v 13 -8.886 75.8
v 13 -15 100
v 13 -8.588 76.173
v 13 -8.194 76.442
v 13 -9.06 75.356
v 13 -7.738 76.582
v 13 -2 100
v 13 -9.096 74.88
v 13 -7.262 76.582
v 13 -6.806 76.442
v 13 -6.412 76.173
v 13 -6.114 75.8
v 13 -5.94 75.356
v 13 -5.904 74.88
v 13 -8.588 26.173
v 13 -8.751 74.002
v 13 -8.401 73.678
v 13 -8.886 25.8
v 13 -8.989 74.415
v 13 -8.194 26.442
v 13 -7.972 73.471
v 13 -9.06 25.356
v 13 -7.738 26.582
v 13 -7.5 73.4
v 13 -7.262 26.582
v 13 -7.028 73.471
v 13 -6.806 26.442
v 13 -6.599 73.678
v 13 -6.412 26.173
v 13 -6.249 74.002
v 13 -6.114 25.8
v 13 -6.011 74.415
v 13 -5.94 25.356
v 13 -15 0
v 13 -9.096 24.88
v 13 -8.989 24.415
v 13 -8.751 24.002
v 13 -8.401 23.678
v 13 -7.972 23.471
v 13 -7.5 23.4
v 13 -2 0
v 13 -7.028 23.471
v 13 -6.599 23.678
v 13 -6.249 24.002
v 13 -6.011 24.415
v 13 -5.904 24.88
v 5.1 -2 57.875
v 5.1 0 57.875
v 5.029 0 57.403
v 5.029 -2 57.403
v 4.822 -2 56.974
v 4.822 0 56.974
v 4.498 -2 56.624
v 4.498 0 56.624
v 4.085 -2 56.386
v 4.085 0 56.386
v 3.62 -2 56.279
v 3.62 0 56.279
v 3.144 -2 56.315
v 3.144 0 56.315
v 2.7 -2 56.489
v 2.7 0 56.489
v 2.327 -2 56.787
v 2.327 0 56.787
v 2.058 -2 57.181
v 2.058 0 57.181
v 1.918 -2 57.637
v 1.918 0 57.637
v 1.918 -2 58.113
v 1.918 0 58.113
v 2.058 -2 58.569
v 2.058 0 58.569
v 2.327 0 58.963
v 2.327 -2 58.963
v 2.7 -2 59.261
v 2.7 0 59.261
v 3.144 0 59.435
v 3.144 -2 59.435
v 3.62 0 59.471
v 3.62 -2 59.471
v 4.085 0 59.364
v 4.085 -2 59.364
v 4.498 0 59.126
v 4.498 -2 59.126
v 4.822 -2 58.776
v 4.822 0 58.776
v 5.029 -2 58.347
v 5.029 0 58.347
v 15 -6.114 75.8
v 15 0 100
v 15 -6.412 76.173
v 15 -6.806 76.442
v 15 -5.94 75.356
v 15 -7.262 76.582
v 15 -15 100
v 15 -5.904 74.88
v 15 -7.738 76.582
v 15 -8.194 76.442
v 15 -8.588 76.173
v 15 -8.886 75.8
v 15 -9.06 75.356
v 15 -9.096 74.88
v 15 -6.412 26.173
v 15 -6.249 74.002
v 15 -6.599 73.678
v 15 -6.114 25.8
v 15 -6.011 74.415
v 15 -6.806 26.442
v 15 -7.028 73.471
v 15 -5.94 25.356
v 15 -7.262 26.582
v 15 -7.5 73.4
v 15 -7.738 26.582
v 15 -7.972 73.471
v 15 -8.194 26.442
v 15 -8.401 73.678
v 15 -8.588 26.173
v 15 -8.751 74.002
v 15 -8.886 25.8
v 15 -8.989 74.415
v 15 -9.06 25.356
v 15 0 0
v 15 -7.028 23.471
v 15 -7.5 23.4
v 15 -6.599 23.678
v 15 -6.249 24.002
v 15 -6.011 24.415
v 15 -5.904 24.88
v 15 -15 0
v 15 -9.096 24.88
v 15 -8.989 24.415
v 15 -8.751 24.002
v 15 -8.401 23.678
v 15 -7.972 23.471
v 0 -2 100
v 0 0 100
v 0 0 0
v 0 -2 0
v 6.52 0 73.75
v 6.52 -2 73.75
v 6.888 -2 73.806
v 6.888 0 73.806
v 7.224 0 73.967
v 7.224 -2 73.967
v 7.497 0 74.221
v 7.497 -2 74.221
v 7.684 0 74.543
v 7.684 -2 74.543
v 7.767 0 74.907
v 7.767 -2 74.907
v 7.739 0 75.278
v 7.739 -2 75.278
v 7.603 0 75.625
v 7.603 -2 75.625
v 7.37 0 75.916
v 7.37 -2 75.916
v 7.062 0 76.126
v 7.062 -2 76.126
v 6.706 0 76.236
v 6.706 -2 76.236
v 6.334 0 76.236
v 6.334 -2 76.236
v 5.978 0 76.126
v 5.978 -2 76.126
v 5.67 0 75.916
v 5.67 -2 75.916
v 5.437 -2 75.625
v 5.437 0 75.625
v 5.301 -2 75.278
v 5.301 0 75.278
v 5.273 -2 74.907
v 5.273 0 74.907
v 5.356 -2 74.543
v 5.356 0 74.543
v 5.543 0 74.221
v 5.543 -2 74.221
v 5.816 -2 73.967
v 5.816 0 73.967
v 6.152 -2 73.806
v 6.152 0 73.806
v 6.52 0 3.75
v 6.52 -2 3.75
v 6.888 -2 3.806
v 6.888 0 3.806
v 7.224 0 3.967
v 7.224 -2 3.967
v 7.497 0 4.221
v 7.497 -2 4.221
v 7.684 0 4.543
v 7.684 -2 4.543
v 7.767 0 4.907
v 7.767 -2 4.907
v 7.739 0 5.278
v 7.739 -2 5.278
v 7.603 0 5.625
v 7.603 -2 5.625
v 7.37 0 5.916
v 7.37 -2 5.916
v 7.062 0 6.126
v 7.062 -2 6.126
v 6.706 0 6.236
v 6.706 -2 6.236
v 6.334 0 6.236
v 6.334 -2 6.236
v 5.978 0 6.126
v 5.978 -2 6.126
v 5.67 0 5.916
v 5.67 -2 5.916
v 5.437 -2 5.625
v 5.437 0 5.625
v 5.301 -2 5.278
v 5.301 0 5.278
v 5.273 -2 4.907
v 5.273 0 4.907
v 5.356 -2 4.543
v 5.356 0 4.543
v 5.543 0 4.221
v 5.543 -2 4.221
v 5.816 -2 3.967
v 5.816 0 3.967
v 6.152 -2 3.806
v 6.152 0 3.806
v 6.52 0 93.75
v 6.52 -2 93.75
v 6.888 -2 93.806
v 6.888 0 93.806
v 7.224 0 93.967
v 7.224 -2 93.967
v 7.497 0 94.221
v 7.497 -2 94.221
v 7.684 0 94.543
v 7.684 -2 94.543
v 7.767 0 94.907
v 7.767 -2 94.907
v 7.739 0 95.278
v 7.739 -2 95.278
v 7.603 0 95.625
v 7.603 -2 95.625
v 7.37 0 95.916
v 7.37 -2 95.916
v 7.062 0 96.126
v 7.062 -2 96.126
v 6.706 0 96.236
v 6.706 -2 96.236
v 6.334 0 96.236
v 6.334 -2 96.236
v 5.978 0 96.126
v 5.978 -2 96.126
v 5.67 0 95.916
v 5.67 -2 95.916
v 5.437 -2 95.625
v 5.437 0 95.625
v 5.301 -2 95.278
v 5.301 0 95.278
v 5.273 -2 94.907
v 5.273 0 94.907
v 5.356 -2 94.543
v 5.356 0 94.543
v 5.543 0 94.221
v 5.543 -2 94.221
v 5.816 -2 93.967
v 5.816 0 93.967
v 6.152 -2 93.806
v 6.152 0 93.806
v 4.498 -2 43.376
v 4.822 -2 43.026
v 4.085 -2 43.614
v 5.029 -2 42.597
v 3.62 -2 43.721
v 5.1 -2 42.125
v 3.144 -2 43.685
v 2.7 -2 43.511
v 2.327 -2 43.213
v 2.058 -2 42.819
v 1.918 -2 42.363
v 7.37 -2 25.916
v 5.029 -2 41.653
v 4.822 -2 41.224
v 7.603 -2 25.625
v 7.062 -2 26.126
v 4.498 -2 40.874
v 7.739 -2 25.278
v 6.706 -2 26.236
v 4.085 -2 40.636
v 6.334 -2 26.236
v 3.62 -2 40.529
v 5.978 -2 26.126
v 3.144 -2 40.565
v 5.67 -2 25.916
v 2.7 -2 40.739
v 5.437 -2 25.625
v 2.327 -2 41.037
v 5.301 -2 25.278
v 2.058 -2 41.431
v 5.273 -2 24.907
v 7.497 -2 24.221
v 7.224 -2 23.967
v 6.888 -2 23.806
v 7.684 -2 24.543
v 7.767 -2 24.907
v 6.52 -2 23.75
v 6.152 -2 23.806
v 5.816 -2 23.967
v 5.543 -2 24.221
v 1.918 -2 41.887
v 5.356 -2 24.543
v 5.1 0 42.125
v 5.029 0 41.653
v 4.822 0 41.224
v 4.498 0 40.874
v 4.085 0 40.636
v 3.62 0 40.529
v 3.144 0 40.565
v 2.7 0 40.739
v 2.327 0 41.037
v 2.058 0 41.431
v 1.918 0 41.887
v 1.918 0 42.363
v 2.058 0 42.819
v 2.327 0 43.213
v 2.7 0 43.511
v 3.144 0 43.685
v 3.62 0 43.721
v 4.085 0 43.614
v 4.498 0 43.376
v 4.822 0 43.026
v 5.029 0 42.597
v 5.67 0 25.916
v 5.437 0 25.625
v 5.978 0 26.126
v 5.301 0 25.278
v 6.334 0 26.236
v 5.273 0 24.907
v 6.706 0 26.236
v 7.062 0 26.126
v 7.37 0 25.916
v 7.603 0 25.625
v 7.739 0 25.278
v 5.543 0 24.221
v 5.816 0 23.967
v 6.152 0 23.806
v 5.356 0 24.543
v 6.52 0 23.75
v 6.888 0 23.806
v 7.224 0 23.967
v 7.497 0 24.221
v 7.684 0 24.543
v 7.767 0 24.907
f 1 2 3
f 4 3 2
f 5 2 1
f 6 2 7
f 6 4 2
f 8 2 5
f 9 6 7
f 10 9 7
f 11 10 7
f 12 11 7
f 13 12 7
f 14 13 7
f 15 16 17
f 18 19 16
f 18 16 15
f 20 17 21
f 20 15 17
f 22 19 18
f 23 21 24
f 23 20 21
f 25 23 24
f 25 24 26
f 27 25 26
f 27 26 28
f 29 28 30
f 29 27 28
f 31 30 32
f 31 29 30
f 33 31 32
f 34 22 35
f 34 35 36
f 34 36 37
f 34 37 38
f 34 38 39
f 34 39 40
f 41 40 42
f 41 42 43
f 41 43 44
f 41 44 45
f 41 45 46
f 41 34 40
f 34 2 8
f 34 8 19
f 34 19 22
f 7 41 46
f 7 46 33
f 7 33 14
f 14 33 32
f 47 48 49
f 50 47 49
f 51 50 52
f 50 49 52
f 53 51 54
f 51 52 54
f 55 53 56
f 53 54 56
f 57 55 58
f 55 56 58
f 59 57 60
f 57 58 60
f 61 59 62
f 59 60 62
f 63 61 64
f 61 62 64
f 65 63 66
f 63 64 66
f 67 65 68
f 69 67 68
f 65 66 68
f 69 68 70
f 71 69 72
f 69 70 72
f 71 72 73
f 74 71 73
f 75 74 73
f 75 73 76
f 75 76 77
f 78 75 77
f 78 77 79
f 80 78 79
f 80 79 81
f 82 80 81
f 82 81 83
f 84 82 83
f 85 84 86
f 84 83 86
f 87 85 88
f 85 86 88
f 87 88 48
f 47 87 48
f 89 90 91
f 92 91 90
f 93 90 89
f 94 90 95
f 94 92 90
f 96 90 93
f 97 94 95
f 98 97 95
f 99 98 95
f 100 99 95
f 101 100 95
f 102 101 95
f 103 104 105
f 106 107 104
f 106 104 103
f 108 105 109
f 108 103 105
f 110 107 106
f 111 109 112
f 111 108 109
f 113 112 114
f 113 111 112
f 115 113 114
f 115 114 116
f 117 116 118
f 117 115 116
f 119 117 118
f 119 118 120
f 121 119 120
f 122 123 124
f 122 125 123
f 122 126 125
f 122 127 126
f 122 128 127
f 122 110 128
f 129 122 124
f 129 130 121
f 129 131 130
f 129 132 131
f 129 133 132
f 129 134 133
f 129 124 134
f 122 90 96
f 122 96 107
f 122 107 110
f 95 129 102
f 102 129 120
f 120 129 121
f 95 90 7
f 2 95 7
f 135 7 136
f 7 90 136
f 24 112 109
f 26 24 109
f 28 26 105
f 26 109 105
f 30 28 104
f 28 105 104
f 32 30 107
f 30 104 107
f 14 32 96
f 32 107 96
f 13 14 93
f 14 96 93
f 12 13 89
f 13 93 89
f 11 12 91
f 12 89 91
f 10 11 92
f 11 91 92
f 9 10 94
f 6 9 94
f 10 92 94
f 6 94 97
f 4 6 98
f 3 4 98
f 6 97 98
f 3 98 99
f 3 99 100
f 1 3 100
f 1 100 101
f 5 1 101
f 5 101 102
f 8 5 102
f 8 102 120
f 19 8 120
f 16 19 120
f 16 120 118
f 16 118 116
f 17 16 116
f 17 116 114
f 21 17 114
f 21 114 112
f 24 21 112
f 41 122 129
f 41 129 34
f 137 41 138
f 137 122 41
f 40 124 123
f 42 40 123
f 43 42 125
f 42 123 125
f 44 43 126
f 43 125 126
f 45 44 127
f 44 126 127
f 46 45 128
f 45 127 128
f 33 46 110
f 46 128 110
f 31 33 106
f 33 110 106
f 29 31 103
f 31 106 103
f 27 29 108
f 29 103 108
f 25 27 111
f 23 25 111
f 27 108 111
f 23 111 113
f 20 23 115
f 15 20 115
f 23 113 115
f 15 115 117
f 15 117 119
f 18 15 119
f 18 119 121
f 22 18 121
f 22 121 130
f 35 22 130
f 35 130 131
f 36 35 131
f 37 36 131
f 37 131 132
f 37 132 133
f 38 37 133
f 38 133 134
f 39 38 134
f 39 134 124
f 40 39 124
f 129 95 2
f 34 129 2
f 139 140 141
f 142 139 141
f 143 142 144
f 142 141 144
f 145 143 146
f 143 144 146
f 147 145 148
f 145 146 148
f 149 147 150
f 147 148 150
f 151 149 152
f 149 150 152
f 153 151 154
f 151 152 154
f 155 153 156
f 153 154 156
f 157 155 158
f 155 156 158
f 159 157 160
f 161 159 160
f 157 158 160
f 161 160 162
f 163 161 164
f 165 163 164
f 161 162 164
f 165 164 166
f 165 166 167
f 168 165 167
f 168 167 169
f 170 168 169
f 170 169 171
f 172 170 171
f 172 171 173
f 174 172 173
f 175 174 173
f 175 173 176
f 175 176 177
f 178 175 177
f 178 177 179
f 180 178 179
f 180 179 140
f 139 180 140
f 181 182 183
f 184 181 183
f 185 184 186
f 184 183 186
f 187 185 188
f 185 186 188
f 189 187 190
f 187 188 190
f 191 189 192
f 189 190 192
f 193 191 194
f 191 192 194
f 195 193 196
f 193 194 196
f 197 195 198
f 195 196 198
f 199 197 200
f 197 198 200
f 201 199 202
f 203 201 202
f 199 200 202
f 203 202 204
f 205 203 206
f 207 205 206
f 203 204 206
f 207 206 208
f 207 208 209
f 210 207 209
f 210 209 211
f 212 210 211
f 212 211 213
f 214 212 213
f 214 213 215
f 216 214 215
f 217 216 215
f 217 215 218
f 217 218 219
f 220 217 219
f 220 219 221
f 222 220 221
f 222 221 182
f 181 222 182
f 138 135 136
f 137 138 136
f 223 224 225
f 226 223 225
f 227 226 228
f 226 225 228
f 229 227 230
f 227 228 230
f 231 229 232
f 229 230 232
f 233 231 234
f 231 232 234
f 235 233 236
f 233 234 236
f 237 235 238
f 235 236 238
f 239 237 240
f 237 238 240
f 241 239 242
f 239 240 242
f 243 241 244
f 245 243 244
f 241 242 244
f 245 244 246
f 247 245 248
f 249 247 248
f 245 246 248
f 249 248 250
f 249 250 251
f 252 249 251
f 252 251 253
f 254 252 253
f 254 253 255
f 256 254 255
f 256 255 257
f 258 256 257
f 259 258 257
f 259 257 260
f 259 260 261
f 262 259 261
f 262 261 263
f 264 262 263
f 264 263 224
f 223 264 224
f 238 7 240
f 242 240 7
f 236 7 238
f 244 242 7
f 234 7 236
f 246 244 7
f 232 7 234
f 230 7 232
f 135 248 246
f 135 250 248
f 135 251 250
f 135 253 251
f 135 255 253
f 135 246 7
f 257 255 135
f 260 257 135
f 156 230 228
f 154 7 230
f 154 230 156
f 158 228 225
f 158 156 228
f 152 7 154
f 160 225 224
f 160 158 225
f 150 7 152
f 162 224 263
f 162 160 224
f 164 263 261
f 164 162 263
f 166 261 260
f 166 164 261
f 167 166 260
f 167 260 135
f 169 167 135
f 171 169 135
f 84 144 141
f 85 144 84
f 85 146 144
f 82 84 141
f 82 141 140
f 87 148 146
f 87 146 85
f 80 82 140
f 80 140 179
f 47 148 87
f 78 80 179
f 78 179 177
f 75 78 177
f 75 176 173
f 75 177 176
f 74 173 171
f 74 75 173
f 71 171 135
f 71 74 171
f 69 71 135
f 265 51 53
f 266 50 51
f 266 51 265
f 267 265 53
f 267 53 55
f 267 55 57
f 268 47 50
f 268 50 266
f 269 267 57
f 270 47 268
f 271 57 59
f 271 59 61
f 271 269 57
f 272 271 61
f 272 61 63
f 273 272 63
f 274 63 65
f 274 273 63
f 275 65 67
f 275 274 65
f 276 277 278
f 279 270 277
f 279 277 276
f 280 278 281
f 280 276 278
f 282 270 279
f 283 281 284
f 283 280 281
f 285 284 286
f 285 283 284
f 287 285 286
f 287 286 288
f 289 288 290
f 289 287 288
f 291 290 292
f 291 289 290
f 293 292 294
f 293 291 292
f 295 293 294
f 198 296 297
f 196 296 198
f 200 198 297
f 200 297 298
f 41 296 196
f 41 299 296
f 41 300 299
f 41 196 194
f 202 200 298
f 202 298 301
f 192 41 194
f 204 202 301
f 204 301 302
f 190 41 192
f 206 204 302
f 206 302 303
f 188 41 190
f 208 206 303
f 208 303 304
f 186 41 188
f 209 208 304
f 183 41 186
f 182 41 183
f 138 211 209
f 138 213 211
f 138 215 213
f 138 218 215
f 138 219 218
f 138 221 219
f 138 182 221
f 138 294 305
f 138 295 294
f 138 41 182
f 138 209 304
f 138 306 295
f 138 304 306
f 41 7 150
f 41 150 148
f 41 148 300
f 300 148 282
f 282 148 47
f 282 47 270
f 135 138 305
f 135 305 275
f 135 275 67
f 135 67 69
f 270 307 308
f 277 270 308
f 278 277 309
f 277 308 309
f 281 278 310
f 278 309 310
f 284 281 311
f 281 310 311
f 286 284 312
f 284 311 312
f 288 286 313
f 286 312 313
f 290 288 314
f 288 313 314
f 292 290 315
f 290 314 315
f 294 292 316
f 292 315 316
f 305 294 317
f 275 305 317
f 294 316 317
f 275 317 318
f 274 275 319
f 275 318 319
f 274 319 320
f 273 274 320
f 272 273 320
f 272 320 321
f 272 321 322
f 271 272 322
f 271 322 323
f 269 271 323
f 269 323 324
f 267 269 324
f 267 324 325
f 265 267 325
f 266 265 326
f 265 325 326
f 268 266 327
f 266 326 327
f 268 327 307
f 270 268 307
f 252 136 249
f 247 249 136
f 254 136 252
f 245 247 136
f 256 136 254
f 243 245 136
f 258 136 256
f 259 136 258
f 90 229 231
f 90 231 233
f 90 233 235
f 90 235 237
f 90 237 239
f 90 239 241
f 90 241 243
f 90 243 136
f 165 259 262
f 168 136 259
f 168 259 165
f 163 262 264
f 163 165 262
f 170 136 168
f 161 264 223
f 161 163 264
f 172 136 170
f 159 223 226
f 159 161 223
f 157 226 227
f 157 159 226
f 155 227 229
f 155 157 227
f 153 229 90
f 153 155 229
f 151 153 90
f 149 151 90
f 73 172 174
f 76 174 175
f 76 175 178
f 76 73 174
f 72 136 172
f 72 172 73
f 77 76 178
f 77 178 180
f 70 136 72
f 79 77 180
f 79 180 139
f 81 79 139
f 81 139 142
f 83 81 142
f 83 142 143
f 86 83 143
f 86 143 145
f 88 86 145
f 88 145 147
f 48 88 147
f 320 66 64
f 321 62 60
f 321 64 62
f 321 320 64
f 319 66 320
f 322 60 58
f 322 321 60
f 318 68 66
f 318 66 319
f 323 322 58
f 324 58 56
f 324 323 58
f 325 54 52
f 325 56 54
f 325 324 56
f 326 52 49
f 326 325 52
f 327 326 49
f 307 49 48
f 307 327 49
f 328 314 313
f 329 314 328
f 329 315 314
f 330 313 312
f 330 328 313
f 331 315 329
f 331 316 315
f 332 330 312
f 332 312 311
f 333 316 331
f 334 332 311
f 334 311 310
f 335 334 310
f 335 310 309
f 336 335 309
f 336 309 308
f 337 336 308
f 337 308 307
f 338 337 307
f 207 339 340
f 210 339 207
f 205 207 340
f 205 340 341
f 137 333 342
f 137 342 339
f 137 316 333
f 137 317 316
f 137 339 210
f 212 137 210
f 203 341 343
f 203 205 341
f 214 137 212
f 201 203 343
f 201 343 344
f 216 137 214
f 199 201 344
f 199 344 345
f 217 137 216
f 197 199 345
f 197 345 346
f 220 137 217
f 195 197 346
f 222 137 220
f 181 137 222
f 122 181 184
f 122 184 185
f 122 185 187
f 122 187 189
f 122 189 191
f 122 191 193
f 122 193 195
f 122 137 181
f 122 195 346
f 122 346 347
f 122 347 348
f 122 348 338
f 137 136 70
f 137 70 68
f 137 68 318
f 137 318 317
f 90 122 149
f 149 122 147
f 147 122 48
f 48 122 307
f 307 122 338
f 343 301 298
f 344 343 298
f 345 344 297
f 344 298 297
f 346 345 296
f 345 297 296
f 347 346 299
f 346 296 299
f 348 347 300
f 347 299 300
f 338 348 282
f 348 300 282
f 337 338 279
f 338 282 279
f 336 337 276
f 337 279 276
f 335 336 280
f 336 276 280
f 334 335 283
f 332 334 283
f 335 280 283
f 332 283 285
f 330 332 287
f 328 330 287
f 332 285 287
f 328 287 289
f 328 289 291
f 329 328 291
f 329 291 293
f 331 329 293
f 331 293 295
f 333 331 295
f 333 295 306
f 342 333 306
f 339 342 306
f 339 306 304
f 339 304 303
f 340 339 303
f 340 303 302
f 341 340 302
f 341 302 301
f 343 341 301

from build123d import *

# Parameters (mm, degrees)
EXTRUDE_1_DEPTH     = 100
SKETCH_4_R          = 1.6
CUT_EXTRUDE_3_DEPTH = 2
M3X0_5_1_D          = 2.5
M3X0_5_1_DEPTH      = 8.5
M3X0_5_1_TIP        = 0.751075774
SKETCH_2_R          = 1.6
CUT_EXTRUDE_4_DEPTH = 10


with BuildPart() as part:
    # ｽｹｯﾁ1 → ﾎﾞｽ - 押し出し1 (new body)
    with BuildSketch(Plane.XY):
        Polygon((0, 0), (15, 0), (15, -15), (13, -15), (13, -2), (0, -2), align=None)
    extrude(amount=EXTRUDE_1_DEPTH)

    # ｽｹｯﾁ4 → ｶｯﾄ - 押し出し3 (cut)
    with BuildSketch(Plane(origin=(0, 0, 0), x_dir=(1, 0, 0), z_dir=(0, 1, 0))):
        with Locations((3.5, -57.875)):
            Circle(SKETCH_4_R)
        with Locations((3.5, -42.125)):
            Circle(SKETCH_4_R)
    extrude(amount=-CUT_EXTRUDE_3_DEPTH, mode=Mode.SUBTRACT)

    # M3x0.5 ねじ穴1
    with Locations(Plane(origin=(6.52, 0, 75), x_dir=(0, 0, 1), z_dir=(0, 1, 0))):
        with Locations((0, 0), (-50, 0), (20, 0), (-70, 0)):
            Hole(M3X0_5_1_D / 2, depth=M3X0_5_1_DEPTH)
            with Locations((0, 0, -(M3X0_5_1_DEPTH + M3X0_5_1_TIP / 2))):  # 118° drill point
                Cone(0, M3X0_5_1_D / 2, M3X0_5_1_TIP, mode=Mode.SUBTRACT)

    # ｽｹｯﾁ2 → ｶｯﾄ - 押し出し4 (cut)
    with BuildSketch(Plane(origin=(15, 0, 0), x_dir=(0, 0, -1), z_dir=(1, 0, 0))):
        with Locations((-75, -7.5)):
            Circle(SKETCH_2_R)
        with Locations((-25, -7.5)):
            Circle(SKETCH_2_R)
    extrude(amount=-CUT_EXTRUDE_4_DEPTH, mode=Mode.SUBTRACT)


solid = part.part
